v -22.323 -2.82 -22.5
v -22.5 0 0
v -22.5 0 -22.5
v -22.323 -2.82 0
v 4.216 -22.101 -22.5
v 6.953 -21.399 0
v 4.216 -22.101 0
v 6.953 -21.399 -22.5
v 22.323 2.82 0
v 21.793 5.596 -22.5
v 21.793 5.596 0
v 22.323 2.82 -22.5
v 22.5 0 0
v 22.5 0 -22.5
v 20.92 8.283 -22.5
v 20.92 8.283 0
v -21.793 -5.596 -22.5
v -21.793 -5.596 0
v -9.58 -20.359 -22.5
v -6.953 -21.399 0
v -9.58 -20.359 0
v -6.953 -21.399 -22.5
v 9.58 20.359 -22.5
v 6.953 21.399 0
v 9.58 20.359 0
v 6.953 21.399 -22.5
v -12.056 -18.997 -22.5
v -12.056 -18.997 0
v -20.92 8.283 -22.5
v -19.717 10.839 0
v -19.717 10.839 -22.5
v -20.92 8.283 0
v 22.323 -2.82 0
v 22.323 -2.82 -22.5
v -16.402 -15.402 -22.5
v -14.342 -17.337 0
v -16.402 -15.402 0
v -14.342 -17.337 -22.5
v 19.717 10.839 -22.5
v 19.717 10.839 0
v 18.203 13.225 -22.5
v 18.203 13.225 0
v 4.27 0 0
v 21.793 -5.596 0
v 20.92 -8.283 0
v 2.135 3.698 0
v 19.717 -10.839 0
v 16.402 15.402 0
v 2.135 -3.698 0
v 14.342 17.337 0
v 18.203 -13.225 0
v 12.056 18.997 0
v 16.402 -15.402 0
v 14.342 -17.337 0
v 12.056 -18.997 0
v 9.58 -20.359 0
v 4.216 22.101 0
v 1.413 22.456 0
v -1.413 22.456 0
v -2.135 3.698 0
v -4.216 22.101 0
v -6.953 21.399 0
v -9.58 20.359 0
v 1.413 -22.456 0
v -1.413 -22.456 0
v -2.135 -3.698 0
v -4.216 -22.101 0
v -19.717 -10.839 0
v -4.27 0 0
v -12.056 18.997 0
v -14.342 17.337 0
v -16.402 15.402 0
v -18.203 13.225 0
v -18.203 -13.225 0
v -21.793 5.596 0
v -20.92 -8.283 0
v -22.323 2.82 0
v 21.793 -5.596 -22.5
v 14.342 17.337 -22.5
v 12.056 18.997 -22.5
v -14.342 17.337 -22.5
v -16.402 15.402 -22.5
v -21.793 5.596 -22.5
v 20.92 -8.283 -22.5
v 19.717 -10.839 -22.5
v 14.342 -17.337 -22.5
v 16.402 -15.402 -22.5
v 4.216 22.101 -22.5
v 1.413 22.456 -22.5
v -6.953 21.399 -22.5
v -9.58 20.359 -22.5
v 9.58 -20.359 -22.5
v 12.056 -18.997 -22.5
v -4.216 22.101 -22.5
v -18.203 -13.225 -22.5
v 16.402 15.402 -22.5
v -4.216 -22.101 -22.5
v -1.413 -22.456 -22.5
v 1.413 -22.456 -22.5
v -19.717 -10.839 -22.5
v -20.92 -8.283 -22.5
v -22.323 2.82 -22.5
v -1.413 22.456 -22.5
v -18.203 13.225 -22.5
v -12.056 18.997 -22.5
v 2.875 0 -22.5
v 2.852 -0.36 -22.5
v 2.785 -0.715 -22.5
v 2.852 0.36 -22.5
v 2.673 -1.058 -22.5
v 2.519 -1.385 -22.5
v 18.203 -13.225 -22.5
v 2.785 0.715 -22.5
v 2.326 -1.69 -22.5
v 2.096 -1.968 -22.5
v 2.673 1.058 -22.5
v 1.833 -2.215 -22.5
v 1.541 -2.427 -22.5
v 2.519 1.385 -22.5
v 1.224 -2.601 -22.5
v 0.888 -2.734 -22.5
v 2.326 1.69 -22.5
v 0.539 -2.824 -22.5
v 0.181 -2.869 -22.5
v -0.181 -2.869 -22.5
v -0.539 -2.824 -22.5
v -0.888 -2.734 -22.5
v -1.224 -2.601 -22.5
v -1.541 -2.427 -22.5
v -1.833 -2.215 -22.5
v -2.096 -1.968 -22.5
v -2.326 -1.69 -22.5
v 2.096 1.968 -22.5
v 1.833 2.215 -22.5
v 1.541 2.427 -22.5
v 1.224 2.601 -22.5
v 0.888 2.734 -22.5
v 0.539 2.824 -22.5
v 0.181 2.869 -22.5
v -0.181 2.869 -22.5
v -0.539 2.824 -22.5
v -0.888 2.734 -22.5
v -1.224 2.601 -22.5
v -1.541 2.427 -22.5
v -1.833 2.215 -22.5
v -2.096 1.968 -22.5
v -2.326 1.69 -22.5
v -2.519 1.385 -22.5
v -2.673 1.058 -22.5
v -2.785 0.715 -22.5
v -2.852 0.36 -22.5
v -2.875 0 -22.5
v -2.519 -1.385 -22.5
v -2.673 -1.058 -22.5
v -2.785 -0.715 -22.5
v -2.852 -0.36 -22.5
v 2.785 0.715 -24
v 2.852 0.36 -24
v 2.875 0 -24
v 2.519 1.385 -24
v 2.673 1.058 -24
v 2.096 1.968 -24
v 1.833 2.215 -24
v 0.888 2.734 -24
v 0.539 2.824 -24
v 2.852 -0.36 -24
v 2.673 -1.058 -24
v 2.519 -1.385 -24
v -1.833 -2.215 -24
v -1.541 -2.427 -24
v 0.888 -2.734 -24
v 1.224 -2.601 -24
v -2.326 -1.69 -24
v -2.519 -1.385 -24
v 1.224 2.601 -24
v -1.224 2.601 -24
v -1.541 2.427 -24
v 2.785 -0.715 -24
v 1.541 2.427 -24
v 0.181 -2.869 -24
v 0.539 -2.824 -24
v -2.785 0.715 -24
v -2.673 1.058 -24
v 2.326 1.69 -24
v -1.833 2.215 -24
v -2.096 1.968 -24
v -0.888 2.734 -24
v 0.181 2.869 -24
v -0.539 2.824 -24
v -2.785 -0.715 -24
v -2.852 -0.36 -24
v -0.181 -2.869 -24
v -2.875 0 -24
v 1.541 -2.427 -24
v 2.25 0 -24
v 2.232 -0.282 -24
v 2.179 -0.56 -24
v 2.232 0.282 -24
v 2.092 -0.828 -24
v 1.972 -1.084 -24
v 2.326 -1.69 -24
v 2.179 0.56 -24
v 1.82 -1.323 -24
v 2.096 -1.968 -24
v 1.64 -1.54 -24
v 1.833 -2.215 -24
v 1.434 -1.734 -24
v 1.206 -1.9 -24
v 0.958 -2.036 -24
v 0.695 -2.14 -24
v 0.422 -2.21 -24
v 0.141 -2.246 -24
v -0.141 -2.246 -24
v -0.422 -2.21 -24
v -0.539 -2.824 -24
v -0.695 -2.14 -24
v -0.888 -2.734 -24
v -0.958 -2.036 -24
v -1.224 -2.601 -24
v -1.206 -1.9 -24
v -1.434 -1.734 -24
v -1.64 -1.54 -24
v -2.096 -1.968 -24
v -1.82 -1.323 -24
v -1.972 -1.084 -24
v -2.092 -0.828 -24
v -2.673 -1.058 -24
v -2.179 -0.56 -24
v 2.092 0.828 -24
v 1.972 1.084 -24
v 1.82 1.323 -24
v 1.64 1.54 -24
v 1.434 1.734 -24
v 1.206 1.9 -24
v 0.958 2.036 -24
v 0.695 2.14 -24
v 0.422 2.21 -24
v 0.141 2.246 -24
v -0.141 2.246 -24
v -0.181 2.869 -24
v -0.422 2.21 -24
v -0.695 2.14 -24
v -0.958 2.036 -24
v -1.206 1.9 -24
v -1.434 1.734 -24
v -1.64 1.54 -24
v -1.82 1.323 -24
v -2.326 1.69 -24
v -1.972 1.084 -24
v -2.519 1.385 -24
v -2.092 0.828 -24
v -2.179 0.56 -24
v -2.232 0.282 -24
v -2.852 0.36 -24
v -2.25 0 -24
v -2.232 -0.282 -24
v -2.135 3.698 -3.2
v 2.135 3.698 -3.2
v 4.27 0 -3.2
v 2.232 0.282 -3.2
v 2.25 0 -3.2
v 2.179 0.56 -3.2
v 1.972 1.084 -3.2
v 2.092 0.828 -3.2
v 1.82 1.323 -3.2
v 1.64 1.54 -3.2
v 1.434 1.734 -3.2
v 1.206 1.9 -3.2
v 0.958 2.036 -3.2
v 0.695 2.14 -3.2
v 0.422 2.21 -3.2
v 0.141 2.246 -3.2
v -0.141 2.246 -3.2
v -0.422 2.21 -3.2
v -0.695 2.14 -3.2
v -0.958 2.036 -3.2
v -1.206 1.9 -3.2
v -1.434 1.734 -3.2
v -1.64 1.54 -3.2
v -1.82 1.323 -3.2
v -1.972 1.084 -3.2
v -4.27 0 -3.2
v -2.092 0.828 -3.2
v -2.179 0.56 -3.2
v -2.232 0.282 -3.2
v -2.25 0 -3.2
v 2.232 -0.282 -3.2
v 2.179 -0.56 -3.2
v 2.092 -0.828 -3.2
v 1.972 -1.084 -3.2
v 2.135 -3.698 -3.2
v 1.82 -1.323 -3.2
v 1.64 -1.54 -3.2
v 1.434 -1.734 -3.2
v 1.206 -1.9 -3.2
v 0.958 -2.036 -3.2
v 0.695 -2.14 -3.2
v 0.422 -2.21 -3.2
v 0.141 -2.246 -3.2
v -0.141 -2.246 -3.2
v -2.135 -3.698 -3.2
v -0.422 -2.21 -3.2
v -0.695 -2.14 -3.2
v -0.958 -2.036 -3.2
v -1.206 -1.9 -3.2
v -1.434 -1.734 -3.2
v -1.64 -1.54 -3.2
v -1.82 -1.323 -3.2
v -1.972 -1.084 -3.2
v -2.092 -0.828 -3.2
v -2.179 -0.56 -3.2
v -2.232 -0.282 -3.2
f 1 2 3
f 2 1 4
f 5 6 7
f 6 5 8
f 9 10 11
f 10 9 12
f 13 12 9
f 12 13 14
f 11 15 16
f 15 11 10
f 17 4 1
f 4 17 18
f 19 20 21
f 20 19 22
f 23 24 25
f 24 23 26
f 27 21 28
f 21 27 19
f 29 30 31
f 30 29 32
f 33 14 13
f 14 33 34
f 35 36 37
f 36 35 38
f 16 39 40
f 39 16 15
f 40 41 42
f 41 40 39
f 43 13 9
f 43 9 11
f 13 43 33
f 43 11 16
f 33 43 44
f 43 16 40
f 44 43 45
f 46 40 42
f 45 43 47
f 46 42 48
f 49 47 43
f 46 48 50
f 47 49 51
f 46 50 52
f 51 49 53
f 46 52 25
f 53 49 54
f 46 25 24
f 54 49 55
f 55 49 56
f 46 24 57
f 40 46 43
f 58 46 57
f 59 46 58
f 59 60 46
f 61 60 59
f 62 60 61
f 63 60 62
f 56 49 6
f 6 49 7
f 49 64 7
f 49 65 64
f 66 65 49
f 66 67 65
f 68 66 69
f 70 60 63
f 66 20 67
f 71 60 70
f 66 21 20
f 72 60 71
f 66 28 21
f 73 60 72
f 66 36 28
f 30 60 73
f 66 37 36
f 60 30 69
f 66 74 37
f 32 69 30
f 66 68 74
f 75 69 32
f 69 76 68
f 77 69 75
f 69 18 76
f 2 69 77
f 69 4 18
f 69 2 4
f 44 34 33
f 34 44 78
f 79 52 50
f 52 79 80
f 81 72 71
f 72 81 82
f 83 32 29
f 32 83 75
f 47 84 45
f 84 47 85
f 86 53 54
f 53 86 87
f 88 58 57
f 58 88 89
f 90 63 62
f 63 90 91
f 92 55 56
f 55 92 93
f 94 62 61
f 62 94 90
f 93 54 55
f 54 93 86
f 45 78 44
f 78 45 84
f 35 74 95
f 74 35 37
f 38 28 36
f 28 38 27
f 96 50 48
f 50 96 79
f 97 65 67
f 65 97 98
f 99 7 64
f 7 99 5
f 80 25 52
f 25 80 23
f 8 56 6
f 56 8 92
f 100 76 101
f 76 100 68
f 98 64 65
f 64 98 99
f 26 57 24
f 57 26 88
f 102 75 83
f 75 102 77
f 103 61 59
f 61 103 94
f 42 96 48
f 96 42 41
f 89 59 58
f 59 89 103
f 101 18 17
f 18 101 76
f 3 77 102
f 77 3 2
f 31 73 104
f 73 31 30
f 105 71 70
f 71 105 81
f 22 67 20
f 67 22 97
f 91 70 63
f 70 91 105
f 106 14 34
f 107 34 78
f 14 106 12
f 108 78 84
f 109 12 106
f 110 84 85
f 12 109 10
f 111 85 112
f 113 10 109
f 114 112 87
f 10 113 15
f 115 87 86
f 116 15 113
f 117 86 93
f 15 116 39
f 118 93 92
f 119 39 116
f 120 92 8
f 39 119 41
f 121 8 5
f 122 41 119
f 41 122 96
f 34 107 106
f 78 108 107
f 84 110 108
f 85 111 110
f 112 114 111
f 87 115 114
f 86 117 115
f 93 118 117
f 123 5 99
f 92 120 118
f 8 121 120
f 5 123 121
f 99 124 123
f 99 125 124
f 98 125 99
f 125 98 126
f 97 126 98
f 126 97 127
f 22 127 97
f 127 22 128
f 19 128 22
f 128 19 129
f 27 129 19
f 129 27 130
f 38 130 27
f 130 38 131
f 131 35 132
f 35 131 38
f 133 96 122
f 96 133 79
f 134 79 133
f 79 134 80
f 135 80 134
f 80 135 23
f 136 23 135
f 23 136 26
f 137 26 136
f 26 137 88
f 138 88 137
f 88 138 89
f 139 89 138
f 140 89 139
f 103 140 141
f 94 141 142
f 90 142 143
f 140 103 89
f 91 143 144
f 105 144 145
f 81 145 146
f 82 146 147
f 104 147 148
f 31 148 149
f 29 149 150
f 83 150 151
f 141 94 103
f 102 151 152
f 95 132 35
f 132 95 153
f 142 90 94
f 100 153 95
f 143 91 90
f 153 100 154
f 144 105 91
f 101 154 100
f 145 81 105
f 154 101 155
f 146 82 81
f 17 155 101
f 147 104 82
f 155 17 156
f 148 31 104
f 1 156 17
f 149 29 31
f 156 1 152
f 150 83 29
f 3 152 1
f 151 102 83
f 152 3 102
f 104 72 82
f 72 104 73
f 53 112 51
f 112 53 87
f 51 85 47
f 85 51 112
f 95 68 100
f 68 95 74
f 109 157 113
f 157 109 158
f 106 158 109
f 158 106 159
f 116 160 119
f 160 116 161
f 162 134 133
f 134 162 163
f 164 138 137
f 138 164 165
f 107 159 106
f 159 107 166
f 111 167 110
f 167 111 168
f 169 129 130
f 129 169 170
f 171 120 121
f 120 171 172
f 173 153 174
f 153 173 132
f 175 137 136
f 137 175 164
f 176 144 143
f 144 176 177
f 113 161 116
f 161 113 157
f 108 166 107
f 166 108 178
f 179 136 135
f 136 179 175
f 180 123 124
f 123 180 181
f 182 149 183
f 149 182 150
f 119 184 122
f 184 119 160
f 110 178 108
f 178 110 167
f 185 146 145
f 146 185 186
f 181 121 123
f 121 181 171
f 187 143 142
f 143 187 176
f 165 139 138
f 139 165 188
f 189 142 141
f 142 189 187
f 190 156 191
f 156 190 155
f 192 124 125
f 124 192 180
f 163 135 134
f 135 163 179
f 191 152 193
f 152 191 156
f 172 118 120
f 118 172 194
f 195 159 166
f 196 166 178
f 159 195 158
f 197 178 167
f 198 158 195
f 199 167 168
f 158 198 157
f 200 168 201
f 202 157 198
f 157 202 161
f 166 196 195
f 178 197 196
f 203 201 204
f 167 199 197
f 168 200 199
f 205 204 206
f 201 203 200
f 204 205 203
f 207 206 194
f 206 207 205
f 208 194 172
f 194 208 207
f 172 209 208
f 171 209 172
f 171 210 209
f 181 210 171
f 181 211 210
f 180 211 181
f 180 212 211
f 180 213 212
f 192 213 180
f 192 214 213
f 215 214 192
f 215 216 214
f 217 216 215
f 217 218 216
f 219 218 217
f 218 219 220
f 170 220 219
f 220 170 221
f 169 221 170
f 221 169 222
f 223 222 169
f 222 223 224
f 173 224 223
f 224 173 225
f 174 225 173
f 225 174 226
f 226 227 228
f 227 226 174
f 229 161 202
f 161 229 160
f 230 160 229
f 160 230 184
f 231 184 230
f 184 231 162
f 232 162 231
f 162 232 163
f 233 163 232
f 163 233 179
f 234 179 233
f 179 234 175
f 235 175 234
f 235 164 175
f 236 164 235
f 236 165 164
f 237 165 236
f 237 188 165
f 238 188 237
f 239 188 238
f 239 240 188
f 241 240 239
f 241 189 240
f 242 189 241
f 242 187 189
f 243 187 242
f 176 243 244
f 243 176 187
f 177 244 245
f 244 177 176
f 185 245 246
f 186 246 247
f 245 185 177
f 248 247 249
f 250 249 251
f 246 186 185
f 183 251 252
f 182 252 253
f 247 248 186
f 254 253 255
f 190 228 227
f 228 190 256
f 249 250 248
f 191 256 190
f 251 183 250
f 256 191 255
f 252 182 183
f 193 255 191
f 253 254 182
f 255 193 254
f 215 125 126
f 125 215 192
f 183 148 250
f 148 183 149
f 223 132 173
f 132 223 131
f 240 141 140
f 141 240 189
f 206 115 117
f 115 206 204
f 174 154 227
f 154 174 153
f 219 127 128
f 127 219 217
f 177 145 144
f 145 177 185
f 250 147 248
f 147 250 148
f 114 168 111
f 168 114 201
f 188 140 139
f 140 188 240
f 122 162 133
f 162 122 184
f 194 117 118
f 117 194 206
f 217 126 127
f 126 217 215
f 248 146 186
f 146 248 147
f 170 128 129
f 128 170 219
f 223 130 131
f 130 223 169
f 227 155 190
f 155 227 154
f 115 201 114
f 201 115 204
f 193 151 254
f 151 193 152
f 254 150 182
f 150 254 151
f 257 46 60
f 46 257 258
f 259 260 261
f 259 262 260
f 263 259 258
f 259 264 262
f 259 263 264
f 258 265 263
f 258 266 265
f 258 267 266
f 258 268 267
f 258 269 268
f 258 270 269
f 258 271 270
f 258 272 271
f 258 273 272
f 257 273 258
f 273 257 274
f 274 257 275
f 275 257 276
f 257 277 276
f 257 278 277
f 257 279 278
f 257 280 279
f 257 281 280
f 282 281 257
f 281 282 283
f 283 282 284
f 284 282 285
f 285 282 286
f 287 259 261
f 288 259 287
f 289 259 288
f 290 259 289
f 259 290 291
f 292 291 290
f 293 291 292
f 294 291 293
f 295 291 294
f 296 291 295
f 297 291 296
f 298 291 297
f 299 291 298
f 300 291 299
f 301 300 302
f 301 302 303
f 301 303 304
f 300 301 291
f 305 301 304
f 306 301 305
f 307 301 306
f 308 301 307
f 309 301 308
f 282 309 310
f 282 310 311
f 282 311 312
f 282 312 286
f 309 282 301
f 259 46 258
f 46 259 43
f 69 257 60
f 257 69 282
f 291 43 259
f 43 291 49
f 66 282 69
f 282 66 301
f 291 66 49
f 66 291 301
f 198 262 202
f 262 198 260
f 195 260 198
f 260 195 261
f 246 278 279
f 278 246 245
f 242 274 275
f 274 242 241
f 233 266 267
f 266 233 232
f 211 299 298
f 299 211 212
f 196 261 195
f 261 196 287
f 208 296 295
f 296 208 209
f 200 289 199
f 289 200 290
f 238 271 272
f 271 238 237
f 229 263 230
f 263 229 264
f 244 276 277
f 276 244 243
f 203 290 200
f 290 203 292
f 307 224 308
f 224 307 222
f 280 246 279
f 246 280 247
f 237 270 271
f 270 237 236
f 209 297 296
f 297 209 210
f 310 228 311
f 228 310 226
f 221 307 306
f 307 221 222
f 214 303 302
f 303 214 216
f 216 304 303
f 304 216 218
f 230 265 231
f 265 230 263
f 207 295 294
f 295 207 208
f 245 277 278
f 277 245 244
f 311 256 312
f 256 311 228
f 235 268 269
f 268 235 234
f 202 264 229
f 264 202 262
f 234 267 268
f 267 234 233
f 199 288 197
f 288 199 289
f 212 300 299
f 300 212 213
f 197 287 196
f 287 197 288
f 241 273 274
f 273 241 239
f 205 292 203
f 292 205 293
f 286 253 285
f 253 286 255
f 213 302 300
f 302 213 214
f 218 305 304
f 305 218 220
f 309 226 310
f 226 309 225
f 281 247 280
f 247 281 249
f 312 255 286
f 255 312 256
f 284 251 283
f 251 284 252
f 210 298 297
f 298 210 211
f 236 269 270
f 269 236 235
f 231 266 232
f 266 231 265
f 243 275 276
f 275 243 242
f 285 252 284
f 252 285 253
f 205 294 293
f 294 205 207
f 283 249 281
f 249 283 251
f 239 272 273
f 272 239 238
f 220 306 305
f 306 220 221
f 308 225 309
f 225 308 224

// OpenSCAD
$fn = 50;

difference() {
	union() {
		translate(v = [0, 0, -22.5]) {
			cylinder(h = 22.5, r = 22.5);
		}
		#translate(v = [0, 0, -24.0]) {
			cylinder(h = 24, r = 2.875);
		}
	}
	union() {
		translate(v = [0, 0, 0]) {
			rotate(a = [0, 0, 0]) {
				difference() {
					union() {
						translate(v = [0, 0, -3.2]) {
							linear_extrude(height = 3.2) {
								polygon(points = [[4.2698, 0.0], [2.1349000000000005, 3.697755269078796], [-2.134899999999999, 3.6977552690787965], [-4.2698, 5.228996902999369e-16], [-2.134900000000002, -3.6977552690787956], [2.1348999999999974, -3.697755269078798]]);
							}
						}
					}
					union();
				}
			}
		}
		#translate(v = [0, 0, -100.0]) {
			cylinder(h = 200, r = 2.25);
		}
	}
}
